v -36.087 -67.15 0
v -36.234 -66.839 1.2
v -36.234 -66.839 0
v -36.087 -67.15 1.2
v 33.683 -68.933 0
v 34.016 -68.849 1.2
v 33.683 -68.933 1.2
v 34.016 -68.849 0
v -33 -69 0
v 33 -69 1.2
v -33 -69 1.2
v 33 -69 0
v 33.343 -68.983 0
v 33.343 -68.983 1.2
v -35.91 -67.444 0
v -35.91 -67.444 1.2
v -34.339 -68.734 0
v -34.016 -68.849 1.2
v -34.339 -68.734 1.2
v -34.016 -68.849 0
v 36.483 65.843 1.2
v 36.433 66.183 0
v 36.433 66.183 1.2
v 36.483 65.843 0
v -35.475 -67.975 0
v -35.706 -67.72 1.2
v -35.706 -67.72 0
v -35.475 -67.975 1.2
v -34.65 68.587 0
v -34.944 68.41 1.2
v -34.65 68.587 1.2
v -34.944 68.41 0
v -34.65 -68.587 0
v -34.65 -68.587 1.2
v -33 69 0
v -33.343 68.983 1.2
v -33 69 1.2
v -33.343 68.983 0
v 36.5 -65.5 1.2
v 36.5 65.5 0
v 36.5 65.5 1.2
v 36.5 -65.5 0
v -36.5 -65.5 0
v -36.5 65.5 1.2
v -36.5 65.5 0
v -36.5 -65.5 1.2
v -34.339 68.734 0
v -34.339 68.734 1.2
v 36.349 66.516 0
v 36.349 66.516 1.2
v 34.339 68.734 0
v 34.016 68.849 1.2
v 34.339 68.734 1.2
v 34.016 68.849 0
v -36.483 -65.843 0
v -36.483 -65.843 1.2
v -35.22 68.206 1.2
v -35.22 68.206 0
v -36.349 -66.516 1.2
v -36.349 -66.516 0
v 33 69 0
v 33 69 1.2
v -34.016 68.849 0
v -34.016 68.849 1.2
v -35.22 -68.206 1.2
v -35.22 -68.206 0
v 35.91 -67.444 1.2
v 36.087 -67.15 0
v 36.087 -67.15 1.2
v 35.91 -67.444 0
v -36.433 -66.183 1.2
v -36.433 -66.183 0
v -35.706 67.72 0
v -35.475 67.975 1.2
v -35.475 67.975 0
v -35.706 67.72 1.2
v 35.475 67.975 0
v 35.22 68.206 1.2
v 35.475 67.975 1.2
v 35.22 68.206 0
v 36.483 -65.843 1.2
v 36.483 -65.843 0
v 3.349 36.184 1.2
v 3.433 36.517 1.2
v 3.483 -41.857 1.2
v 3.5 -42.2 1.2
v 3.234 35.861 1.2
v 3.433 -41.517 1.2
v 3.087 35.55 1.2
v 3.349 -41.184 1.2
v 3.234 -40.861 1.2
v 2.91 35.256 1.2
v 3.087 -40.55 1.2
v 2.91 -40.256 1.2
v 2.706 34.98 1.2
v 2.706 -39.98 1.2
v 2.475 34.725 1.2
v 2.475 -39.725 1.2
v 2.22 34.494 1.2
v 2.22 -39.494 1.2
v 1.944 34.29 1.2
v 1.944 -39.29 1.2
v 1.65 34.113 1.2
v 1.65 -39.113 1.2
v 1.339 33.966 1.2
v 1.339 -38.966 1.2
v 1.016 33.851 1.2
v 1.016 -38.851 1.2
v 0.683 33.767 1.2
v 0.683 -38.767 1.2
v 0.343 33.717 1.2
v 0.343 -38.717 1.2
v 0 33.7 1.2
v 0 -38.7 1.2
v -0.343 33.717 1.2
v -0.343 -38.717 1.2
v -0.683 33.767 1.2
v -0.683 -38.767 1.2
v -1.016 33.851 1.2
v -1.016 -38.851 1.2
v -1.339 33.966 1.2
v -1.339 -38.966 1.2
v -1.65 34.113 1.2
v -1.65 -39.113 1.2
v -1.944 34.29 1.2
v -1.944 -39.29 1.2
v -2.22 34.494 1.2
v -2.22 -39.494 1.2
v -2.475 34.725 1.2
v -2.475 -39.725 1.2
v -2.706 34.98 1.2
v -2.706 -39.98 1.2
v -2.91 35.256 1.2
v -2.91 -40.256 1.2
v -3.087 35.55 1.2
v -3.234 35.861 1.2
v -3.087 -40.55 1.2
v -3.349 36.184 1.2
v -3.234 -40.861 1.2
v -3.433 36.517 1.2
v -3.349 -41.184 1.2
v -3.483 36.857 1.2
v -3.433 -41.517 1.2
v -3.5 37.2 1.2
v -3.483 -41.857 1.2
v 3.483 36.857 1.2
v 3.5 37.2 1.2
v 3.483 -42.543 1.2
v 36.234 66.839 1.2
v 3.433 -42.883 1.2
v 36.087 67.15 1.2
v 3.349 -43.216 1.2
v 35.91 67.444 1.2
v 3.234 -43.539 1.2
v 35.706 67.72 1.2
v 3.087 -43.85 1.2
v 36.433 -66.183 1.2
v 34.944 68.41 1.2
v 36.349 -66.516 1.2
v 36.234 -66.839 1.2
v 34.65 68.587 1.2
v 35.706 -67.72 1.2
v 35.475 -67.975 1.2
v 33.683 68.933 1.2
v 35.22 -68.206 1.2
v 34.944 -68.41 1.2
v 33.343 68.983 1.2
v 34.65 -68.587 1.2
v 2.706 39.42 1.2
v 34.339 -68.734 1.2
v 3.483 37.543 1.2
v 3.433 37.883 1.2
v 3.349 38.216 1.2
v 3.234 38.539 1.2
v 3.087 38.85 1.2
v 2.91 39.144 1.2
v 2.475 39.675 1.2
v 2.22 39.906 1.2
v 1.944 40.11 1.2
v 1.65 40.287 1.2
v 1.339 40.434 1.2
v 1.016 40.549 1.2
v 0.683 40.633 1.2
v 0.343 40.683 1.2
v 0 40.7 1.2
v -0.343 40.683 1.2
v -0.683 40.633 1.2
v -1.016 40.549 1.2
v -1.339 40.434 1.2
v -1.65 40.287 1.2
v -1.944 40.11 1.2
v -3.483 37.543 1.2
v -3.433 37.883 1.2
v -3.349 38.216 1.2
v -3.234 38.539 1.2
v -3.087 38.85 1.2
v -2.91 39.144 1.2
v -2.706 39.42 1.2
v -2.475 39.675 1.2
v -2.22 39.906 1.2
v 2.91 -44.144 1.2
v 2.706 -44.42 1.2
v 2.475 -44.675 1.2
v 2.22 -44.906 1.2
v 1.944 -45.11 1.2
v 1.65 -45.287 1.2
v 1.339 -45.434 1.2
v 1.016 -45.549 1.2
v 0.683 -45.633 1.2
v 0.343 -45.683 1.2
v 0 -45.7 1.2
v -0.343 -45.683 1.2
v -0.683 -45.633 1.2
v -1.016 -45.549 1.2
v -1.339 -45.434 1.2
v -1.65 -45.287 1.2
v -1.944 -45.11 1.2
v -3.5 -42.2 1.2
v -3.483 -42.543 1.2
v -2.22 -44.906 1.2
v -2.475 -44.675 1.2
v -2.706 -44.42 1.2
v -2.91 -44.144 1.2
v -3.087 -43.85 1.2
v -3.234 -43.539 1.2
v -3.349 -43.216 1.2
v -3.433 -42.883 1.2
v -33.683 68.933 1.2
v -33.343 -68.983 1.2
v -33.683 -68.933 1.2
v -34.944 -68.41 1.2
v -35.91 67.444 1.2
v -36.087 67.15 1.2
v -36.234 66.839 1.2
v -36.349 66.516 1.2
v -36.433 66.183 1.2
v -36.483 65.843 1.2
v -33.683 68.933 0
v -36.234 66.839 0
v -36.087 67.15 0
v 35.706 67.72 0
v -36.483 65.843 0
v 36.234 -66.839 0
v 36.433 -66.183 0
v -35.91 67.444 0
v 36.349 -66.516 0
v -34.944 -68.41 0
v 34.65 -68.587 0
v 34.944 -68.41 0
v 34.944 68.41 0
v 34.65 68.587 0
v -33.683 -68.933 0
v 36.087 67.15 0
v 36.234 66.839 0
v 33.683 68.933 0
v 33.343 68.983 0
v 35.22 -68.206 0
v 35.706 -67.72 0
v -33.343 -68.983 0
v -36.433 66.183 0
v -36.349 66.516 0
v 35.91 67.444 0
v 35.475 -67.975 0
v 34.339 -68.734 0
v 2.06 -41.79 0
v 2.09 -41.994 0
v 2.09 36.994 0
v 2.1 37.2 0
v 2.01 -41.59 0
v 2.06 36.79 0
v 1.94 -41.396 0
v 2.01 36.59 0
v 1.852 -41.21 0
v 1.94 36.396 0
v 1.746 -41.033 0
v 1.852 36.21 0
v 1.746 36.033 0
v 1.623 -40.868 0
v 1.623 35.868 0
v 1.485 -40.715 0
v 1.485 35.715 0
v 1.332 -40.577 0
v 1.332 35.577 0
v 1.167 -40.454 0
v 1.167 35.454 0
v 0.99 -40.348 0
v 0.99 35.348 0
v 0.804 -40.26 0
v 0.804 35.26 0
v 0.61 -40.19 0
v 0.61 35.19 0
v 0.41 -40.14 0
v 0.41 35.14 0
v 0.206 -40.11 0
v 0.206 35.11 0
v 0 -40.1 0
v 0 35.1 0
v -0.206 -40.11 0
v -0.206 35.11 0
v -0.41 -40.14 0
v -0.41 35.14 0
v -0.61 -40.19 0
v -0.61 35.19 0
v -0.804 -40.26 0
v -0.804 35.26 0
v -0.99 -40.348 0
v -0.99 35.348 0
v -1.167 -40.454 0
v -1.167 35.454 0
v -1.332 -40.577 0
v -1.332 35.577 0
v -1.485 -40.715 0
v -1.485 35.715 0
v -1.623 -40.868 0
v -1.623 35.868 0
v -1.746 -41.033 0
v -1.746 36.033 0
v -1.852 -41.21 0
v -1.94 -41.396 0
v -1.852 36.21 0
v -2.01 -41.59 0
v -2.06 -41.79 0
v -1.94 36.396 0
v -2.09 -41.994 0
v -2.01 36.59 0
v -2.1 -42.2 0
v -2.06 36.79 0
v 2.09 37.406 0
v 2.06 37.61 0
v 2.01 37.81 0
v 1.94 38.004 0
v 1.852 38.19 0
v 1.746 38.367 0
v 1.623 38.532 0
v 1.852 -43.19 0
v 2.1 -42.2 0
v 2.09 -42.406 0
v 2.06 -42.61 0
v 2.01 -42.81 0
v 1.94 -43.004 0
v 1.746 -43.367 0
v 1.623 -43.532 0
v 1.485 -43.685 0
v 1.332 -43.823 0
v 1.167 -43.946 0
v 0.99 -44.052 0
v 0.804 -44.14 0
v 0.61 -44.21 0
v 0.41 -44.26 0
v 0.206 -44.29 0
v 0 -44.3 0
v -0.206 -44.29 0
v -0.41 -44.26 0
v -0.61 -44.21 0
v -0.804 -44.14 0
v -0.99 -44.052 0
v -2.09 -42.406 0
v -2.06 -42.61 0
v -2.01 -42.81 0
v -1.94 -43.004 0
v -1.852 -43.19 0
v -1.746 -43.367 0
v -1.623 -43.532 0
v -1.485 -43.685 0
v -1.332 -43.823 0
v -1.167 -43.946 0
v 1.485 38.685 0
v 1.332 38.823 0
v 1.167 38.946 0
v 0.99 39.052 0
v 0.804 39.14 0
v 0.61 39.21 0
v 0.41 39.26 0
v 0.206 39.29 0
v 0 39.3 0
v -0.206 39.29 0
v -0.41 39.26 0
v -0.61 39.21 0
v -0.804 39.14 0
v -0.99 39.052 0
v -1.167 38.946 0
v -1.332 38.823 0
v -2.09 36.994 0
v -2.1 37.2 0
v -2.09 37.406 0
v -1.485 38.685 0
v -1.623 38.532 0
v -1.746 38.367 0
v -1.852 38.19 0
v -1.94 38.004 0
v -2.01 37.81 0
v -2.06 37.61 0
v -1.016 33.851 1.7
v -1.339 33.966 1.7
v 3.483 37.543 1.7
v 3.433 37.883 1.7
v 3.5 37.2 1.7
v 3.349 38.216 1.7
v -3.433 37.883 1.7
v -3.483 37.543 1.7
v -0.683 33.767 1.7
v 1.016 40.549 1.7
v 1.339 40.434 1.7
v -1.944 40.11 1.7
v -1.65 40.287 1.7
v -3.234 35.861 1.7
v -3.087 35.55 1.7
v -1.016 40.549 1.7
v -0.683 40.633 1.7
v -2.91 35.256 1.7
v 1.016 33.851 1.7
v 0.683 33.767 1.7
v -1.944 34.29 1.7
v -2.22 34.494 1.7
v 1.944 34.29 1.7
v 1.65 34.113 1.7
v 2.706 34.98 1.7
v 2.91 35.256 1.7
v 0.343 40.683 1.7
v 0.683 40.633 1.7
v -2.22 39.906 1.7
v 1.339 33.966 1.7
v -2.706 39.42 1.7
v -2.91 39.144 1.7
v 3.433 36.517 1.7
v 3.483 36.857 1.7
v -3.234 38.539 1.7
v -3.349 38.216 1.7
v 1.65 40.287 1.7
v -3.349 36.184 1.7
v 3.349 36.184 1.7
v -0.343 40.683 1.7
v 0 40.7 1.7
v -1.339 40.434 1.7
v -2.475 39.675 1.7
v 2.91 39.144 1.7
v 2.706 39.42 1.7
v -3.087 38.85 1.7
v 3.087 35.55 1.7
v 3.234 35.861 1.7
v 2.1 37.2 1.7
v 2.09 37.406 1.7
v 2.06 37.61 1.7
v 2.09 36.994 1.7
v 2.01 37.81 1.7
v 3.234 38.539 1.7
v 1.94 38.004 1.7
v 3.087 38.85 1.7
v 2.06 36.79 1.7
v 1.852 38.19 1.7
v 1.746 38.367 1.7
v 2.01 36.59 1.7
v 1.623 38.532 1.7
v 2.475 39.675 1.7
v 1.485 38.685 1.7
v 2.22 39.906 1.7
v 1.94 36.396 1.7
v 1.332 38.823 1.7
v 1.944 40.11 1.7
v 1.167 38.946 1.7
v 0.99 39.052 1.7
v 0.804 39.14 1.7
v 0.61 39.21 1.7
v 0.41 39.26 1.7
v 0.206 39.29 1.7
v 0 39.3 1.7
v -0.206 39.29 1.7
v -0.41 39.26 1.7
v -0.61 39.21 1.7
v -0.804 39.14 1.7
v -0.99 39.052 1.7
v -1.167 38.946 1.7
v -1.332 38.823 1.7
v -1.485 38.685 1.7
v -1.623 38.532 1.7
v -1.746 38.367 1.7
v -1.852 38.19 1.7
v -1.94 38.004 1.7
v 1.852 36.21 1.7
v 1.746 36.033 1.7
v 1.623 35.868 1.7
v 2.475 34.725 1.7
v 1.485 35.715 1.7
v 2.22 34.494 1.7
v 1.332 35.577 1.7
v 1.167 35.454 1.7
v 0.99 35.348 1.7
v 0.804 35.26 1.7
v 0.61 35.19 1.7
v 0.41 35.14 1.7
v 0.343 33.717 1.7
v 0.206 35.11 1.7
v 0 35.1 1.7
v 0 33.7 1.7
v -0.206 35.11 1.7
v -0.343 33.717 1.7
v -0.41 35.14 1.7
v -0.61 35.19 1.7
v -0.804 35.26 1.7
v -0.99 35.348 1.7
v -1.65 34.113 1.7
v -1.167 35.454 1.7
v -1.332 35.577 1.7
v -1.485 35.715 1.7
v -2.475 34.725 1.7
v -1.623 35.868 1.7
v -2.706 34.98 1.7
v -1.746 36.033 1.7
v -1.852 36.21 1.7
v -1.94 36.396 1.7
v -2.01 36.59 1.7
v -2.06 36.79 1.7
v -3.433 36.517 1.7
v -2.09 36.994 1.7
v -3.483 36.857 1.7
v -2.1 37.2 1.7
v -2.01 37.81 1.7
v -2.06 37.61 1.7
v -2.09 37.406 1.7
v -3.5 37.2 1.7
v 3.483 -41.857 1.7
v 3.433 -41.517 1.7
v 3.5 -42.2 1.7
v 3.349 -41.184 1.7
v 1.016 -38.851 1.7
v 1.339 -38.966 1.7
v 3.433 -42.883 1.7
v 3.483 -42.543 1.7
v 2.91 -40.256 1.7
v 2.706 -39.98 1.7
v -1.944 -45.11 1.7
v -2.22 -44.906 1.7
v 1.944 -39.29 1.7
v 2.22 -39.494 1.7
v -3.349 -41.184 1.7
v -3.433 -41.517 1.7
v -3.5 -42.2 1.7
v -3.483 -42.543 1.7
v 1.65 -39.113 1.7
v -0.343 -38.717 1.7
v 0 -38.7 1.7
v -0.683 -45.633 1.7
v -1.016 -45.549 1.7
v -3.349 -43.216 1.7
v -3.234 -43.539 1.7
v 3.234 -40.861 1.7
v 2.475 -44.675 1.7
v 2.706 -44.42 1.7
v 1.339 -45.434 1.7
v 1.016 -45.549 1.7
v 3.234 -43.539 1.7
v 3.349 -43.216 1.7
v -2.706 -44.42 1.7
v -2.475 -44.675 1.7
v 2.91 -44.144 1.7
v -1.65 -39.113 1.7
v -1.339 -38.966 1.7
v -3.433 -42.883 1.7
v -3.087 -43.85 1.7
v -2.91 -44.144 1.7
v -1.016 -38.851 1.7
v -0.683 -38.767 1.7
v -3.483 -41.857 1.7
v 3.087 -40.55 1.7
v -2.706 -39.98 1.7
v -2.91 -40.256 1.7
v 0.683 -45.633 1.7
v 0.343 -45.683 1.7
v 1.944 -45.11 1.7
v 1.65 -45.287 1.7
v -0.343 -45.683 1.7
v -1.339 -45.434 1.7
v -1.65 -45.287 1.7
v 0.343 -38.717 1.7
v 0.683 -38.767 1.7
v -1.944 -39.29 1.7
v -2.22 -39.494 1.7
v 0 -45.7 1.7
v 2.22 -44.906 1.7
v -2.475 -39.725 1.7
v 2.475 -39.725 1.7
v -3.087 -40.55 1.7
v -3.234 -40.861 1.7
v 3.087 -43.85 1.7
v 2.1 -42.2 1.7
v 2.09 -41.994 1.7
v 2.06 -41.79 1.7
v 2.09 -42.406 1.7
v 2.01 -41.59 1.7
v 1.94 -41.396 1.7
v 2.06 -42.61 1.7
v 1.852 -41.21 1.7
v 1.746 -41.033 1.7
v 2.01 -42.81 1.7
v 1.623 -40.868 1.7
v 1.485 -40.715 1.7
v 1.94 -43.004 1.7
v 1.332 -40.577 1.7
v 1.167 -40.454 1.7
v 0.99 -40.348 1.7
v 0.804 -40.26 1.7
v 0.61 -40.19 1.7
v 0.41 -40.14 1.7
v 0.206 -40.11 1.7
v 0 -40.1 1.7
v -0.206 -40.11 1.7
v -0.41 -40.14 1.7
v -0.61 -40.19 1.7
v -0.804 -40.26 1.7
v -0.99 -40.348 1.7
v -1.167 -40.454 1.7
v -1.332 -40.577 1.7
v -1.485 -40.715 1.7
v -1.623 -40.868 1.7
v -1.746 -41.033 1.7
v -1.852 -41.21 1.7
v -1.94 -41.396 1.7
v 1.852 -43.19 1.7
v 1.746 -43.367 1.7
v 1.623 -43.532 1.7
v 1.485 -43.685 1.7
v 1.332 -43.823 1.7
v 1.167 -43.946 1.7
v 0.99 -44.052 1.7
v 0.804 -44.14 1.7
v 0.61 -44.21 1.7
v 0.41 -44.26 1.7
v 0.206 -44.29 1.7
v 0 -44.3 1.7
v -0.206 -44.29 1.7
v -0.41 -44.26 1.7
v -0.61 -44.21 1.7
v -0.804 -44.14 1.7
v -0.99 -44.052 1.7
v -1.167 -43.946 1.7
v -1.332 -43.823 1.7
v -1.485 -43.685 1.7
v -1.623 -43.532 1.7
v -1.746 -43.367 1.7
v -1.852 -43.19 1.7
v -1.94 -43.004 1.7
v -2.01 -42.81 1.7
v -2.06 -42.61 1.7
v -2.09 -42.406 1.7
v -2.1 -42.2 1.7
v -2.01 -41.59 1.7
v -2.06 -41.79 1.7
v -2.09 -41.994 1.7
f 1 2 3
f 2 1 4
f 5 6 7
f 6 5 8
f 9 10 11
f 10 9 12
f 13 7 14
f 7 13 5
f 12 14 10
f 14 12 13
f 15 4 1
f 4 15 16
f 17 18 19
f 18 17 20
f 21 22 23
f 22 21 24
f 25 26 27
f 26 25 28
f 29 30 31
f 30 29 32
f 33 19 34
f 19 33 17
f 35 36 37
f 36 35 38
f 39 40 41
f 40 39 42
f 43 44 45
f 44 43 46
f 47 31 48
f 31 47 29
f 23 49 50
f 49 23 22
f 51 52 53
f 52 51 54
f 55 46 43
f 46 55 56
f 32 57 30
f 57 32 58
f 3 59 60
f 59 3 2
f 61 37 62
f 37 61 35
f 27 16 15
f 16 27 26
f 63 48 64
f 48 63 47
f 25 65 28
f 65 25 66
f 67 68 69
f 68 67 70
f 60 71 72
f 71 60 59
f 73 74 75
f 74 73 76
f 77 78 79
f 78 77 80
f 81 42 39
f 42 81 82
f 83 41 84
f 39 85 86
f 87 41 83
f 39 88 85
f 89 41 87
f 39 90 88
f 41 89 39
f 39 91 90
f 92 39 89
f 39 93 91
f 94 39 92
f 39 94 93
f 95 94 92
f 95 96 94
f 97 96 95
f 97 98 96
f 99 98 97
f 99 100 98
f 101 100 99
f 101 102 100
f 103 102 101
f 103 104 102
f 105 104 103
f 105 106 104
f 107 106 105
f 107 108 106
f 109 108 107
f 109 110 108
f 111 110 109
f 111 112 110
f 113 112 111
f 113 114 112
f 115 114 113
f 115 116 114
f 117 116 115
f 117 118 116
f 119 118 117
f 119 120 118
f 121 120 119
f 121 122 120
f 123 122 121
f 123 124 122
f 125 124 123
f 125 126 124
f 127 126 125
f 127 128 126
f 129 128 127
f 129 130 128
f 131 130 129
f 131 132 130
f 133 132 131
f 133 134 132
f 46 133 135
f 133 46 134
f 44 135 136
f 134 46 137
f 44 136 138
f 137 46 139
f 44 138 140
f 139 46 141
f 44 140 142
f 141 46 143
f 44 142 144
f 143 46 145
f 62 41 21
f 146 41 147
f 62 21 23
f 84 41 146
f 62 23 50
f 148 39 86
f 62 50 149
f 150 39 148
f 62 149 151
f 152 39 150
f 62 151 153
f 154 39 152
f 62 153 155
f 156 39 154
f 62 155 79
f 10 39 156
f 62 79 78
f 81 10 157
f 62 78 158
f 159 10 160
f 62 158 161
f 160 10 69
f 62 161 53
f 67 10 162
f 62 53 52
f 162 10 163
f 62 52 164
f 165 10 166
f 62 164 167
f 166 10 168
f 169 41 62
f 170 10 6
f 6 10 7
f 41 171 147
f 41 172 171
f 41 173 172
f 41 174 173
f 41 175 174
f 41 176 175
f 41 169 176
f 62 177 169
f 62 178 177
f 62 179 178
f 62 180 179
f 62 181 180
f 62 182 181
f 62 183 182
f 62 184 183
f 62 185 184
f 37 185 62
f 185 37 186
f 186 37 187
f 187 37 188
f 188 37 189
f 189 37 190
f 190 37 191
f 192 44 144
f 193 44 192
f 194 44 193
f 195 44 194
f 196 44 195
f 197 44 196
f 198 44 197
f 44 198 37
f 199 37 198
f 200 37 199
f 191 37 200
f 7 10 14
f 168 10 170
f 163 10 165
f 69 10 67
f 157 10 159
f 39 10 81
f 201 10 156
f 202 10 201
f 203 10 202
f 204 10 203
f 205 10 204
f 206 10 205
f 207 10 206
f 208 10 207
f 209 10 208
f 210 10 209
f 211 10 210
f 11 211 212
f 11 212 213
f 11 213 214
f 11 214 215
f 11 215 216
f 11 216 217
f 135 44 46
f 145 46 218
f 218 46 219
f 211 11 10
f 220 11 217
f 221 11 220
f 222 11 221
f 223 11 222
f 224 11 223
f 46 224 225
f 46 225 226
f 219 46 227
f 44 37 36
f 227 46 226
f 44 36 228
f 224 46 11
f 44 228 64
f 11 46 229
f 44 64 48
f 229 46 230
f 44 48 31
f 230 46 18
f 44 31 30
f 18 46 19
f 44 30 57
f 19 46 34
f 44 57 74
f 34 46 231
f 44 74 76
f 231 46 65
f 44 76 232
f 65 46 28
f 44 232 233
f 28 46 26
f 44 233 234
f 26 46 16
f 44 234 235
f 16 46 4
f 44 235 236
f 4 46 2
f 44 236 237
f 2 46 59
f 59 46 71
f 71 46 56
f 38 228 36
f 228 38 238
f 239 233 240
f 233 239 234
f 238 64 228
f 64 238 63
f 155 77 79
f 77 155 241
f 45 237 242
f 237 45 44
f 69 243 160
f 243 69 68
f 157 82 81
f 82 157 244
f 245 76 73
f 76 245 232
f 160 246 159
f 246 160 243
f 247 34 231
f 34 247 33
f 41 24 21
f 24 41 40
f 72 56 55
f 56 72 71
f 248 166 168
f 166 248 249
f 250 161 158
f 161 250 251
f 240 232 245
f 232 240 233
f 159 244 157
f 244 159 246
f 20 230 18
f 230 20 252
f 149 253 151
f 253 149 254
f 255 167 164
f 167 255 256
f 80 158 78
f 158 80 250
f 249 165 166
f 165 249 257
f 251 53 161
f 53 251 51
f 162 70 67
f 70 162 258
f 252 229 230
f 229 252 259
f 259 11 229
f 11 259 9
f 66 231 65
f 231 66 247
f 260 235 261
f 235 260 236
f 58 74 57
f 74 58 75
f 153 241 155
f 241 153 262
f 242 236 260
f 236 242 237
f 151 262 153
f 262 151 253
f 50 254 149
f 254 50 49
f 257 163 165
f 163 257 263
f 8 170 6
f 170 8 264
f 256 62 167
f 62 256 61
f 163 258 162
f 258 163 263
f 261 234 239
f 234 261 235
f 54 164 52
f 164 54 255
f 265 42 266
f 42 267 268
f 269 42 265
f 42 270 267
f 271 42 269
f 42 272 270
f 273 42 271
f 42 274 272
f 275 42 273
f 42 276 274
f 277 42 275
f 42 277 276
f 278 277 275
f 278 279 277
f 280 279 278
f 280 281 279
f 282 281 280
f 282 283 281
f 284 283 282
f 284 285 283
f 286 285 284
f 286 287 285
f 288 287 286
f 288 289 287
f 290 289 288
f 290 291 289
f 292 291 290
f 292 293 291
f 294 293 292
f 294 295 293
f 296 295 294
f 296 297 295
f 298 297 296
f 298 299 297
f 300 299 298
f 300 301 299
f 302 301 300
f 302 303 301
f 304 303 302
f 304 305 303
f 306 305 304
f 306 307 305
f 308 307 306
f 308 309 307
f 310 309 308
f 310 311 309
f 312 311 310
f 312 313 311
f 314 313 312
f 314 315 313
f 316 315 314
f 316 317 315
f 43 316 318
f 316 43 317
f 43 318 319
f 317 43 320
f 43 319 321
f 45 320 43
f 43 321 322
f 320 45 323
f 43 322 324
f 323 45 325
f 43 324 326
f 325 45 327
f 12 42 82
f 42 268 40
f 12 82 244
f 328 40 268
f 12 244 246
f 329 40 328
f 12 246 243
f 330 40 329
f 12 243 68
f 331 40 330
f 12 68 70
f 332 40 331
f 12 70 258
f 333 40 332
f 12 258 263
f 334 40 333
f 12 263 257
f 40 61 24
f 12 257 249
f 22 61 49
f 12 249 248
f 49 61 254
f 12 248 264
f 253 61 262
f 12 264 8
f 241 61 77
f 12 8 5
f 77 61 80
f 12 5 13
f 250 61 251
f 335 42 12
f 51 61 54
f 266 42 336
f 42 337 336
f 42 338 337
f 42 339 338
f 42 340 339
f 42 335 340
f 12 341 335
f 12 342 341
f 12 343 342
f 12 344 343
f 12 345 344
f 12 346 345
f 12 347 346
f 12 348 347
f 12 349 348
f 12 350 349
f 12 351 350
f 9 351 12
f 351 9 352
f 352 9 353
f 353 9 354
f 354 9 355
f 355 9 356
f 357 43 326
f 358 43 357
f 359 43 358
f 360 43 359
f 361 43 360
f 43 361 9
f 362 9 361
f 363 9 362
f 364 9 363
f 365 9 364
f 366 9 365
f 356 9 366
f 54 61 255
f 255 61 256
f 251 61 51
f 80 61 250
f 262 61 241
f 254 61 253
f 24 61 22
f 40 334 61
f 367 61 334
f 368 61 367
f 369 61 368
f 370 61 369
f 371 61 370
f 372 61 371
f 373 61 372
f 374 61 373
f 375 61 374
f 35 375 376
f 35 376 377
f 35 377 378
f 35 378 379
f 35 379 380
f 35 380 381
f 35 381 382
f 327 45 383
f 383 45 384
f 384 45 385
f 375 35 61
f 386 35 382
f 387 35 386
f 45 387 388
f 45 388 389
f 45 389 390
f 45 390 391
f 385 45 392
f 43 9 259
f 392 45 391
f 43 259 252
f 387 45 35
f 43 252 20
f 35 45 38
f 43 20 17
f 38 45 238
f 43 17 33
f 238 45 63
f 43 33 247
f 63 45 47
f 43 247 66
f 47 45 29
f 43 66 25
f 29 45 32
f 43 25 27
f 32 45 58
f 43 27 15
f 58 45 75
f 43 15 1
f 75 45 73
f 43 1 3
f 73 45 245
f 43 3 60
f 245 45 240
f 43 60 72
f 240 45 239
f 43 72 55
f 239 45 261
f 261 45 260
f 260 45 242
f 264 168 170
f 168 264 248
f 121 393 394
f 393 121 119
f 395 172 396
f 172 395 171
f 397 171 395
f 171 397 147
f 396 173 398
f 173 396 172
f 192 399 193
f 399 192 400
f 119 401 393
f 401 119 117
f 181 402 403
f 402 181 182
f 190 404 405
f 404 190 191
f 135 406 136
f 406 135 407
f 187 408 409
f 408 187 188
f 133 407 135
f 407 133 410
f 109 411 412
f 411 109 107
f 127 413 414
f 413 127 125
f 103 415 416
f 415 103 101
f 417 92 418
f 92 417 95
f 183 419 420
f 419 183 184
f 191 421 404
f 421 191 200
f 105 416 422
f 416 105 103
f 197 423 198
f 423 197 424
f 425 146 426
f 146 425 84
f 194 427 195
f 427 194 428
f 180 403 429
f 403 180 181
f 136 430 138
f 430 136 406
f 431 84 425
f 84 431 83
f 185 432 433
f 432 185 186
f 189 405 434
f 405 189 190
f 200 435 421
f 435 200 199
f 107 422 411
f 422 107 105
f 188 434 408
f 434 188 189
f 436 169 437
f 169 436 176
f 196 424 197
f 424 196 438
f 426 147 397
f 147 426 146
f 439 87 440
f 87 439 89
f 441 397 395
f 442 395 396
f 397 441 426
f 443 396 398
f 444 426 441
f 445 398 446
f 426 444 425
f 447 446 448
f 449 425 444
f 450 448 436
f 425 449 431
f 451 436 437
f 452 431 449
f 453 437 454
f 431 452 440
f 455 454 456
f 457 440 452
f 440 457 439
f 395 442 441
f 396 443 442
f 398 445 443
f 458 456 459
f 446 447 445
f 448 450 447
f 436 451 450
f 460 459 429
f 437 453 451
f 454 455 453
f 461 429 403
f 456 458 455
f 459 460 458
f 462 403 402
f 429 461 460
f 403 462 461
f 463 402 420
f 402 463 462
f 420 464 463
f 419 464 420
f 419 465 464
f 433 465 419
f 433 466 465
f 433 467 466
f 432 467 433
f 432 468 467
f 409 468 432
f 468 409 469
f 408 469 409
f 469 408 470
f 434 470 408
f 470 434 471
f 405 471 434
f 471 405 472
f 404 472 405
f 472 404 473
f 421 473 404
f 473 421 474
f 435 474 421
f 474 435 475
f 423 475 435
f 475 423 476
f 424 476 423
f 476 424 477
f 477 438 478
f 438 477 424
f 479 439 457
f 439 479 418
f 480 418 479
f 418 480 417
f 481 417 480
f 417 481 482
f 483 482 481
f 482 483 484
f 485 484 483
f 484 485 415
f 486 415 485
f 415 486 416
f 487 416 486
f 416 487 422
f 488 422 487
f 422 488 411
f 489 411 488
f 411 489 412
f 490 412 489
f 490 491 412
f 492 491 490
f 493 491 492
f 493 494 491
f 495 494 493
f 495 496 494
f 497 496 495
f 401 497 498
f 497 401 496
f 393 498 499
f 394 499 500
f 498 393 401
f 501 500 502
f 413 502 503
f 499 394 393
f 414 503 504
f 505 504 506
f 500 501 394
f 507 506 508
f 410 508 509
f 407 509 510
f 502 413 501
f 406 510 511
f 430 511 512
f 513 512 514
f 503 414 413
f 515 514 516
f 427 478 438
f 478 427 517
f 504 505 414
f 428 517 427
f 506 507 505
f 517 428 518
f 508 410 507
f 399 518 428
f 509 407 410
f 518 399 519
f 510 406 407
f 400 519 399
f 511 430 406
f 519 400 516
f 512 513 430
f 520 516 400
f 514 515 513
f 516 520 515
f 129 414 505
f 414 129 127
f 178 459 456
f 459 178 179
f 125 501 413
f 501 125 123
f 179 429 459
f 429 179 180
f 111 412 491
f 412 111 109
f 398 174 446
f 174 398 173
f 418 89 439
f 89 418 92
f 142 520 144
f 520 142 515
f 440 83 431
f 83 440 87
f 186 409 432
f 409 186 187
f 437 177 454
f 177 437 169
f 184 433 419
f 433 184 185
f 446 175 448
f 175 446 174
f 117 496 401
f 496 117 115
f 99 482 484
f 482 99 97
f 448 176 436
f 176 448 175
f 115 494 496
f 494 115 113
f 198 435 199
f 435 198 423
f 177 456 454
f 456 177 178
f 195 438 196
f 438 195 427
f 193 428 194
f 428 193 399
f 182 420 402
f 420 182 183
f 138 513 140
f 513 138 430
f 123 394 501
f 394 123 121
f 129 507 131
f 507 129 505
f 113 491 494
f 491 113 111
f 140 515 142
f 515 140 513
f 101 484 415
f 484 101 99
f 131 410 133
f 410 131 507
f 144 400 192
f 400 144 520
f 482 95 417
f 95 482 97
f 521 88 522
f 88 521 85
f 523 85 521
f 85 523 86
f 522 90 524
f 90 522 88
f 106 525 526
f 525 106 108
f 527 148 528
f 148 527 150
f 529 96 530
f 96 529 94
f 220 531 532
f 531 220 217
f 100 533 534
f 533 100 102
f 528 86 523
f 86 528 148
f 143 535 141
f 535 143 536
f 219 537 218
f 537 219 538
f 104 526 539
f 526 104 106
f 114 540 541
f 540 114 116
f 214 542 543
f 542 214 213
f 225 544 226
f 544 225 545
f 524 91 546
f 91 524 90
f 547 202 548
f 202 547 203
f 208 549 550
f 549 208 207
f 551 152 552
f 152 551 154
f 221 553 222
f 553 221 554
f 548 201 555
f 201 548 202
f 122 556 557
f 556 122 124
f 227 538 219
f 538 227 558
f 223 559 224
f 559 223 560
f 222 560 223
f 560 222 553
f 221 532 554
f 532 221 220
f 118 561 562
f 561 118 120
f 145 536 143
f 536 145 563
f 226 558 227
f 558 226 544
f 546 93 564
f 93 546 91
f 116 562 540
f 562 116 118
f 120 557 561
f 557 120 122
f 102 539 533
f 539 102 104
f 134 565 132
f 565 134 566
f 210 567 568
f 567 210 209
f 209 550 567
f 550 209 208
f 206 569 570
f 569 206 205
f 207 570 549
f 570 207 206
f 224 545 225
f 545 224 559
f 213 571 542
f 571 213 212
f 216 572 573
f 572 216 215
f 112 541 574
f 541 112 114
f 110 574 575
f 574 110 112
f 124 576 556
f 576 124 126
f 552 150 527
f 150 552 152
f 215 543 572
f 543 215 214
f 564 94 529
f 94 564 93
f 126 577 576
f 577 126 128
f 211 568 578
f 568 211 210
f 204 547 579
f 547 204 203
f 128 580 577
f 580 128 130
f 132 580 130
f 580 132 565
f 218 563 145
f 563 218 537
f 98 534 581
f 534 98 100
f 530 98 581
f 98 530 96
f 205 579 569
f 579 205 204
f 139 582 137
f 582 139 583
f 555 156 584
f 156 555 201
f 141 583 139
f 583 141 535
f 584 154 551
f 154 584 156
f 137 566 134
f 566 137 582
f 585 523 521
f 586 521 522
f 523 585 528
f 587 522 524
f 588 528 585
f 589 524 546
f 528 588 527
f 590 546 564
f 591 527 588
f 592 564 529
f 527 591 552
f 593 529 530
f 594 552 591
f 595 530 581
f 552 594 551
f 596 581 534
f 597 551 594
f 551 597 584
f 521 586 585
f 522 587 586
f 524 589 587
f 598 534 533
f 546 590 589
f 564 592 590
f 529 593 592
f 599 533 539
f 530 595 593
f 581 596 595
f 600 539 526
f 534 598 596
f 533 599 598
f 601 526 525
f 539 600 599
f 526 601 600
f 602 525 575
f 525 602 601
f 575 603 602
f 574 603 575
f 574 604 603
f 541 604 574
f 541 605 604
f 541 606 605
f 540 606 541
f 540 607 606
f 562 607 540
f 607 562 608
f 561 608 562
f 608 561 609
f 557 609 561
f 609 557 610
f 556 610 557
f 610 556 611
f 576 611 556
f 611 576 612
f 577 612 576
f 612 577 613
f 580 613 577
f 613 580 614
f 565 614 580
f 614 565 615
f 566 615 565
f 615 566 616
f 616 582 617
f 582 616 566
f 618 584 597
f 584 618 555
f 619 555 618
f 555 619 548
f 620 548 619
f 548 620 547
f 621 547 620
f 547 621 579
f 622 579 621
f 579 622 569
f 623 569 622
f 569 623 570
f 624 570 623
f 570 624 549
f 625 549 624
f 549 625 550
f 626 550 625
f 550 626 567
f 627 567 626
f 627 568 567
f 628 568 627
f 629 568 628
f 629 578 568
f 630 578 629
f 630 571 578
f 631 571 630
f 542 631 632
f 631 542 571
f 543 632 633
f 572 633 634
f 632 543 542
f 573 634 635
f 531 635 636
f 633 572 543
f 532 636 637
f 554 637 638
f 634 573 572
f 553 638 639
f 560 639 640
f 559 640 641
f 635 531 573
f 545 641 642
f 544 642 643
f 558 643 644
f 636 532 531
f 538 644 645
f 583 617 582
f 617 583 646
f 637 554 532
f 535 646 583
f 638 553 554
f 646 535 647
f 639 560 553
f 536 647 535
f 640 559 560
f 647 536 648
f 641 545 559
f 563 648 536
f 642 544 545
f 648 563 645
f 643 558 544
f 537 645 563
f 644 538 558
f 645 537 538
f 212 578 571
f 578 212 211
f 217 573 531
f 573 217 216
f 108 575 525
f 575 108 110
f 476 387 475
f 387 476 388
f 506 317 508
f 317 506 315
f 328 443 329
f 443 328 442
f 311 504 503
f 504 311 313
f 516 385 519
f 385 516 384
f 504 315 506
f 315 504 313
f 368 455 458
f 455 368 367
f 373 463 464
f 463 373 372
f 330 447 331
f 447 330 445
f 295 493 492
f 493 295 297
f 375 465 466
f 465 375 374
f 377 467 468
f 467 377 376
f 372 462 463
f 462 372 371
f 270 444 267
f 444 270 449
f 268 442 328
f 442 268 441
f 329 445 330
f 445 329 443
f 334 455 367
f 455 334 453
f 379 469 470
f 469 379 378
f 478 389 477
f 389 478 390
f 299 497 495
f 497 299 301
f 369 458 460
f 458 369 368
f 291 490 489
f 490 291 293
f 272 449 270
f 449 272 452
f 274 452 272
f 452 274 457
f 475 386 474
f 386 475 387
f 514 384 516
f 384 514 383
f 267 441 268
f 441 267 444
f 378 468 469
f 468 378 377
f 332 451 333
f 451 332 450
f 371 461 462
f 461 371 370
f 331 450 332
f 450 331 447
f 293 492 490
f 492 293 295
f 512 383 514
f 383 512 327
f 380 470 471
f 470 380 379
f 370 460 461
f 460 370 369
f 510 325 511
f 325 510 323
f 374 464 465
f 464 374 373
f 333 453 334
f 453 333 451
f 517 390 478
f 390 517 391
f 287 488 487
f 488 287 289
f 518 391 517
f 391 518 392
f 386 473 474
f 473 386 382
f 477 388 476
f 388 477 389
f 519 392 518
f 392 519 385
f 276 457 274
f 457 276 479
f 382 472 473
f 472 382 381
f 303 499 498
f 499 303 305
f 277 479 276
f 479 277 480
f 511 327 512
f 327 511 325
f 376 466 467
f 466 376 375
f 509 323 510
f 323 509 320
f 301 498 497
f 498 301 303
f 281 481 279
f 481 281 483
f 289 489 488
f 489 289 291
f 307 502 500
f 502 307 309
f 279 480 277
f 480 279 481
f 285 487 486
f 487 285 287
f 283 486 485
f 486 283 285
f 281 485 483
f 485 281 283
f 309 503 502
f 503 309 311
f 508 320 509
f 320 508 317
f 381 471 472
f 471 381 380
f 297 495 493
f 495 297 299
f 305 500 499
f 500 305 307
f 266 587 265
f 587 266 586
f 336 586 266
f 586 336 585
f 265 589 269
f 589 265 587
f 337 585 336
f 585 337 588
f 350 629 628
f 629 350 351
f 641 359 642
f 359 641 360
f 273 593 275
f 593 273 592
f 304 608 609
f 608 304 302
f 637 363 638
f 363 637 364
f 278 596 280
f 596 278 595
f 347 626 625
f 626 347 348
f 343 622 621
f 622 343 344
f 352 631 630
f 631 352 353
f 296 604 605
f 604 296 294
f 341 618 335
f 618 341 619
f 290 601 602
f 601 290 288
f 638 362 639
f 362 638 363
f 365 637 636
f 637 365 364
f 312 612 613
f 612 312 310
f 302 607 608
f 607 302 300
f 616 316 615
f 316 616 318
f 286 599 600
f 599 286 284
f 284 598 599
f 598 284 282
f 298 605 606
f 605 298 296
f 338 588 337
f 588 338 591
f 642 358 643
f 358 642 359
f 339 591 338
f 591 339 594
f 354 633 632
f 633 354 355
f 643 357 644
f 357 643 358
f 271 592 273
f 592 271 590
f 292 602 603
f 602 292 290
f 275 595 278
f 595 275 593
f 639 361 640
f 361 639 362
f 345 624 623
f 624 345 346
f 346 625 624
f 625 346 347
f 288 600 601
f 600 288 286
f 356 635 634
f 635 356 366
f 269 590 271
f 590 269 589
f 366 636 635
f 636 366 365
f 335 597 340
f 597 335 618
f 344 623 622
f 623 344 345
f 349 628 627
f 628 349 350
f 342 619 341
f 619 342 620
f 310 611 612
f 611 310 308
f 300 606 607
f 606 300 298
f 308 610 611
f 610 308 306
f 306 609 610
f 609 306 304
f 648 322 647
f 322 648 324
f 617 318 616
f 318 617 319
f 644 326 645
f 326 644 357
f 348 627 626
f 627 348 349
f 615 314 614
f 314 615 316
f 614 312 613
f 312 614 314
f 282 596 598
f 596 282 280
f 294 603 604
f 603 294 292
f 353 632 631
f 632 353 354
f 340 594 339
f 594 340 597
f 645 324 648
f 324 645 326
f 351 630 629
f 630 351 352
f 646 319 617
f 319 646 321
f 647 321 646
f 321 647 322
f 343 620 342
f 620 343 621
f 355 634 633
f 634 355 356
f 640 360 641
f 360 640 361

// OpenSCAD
$fn = 64;
module blank_plaque() {
  difference() {
    union() {
      linear_extrude(height=1.200)
        offset(r=3.500) offset(r=-3.500)
          square([73.000, 138.000], center=true);
      translate([0.000, 37.200, 0]) cylinder(h=1.700, r=3.500);
      translate([0.000, -42.200, 0]) cylinder(h=1.700, r=3.500);
    }
    translate([0.000, 37.200, -1]) cylinder(h=3.700, r=2.100);
    translate([0.000, -42.200, -1]) cylinder(h=3.700, r=2.100);
  }
}

blank_plaque();
